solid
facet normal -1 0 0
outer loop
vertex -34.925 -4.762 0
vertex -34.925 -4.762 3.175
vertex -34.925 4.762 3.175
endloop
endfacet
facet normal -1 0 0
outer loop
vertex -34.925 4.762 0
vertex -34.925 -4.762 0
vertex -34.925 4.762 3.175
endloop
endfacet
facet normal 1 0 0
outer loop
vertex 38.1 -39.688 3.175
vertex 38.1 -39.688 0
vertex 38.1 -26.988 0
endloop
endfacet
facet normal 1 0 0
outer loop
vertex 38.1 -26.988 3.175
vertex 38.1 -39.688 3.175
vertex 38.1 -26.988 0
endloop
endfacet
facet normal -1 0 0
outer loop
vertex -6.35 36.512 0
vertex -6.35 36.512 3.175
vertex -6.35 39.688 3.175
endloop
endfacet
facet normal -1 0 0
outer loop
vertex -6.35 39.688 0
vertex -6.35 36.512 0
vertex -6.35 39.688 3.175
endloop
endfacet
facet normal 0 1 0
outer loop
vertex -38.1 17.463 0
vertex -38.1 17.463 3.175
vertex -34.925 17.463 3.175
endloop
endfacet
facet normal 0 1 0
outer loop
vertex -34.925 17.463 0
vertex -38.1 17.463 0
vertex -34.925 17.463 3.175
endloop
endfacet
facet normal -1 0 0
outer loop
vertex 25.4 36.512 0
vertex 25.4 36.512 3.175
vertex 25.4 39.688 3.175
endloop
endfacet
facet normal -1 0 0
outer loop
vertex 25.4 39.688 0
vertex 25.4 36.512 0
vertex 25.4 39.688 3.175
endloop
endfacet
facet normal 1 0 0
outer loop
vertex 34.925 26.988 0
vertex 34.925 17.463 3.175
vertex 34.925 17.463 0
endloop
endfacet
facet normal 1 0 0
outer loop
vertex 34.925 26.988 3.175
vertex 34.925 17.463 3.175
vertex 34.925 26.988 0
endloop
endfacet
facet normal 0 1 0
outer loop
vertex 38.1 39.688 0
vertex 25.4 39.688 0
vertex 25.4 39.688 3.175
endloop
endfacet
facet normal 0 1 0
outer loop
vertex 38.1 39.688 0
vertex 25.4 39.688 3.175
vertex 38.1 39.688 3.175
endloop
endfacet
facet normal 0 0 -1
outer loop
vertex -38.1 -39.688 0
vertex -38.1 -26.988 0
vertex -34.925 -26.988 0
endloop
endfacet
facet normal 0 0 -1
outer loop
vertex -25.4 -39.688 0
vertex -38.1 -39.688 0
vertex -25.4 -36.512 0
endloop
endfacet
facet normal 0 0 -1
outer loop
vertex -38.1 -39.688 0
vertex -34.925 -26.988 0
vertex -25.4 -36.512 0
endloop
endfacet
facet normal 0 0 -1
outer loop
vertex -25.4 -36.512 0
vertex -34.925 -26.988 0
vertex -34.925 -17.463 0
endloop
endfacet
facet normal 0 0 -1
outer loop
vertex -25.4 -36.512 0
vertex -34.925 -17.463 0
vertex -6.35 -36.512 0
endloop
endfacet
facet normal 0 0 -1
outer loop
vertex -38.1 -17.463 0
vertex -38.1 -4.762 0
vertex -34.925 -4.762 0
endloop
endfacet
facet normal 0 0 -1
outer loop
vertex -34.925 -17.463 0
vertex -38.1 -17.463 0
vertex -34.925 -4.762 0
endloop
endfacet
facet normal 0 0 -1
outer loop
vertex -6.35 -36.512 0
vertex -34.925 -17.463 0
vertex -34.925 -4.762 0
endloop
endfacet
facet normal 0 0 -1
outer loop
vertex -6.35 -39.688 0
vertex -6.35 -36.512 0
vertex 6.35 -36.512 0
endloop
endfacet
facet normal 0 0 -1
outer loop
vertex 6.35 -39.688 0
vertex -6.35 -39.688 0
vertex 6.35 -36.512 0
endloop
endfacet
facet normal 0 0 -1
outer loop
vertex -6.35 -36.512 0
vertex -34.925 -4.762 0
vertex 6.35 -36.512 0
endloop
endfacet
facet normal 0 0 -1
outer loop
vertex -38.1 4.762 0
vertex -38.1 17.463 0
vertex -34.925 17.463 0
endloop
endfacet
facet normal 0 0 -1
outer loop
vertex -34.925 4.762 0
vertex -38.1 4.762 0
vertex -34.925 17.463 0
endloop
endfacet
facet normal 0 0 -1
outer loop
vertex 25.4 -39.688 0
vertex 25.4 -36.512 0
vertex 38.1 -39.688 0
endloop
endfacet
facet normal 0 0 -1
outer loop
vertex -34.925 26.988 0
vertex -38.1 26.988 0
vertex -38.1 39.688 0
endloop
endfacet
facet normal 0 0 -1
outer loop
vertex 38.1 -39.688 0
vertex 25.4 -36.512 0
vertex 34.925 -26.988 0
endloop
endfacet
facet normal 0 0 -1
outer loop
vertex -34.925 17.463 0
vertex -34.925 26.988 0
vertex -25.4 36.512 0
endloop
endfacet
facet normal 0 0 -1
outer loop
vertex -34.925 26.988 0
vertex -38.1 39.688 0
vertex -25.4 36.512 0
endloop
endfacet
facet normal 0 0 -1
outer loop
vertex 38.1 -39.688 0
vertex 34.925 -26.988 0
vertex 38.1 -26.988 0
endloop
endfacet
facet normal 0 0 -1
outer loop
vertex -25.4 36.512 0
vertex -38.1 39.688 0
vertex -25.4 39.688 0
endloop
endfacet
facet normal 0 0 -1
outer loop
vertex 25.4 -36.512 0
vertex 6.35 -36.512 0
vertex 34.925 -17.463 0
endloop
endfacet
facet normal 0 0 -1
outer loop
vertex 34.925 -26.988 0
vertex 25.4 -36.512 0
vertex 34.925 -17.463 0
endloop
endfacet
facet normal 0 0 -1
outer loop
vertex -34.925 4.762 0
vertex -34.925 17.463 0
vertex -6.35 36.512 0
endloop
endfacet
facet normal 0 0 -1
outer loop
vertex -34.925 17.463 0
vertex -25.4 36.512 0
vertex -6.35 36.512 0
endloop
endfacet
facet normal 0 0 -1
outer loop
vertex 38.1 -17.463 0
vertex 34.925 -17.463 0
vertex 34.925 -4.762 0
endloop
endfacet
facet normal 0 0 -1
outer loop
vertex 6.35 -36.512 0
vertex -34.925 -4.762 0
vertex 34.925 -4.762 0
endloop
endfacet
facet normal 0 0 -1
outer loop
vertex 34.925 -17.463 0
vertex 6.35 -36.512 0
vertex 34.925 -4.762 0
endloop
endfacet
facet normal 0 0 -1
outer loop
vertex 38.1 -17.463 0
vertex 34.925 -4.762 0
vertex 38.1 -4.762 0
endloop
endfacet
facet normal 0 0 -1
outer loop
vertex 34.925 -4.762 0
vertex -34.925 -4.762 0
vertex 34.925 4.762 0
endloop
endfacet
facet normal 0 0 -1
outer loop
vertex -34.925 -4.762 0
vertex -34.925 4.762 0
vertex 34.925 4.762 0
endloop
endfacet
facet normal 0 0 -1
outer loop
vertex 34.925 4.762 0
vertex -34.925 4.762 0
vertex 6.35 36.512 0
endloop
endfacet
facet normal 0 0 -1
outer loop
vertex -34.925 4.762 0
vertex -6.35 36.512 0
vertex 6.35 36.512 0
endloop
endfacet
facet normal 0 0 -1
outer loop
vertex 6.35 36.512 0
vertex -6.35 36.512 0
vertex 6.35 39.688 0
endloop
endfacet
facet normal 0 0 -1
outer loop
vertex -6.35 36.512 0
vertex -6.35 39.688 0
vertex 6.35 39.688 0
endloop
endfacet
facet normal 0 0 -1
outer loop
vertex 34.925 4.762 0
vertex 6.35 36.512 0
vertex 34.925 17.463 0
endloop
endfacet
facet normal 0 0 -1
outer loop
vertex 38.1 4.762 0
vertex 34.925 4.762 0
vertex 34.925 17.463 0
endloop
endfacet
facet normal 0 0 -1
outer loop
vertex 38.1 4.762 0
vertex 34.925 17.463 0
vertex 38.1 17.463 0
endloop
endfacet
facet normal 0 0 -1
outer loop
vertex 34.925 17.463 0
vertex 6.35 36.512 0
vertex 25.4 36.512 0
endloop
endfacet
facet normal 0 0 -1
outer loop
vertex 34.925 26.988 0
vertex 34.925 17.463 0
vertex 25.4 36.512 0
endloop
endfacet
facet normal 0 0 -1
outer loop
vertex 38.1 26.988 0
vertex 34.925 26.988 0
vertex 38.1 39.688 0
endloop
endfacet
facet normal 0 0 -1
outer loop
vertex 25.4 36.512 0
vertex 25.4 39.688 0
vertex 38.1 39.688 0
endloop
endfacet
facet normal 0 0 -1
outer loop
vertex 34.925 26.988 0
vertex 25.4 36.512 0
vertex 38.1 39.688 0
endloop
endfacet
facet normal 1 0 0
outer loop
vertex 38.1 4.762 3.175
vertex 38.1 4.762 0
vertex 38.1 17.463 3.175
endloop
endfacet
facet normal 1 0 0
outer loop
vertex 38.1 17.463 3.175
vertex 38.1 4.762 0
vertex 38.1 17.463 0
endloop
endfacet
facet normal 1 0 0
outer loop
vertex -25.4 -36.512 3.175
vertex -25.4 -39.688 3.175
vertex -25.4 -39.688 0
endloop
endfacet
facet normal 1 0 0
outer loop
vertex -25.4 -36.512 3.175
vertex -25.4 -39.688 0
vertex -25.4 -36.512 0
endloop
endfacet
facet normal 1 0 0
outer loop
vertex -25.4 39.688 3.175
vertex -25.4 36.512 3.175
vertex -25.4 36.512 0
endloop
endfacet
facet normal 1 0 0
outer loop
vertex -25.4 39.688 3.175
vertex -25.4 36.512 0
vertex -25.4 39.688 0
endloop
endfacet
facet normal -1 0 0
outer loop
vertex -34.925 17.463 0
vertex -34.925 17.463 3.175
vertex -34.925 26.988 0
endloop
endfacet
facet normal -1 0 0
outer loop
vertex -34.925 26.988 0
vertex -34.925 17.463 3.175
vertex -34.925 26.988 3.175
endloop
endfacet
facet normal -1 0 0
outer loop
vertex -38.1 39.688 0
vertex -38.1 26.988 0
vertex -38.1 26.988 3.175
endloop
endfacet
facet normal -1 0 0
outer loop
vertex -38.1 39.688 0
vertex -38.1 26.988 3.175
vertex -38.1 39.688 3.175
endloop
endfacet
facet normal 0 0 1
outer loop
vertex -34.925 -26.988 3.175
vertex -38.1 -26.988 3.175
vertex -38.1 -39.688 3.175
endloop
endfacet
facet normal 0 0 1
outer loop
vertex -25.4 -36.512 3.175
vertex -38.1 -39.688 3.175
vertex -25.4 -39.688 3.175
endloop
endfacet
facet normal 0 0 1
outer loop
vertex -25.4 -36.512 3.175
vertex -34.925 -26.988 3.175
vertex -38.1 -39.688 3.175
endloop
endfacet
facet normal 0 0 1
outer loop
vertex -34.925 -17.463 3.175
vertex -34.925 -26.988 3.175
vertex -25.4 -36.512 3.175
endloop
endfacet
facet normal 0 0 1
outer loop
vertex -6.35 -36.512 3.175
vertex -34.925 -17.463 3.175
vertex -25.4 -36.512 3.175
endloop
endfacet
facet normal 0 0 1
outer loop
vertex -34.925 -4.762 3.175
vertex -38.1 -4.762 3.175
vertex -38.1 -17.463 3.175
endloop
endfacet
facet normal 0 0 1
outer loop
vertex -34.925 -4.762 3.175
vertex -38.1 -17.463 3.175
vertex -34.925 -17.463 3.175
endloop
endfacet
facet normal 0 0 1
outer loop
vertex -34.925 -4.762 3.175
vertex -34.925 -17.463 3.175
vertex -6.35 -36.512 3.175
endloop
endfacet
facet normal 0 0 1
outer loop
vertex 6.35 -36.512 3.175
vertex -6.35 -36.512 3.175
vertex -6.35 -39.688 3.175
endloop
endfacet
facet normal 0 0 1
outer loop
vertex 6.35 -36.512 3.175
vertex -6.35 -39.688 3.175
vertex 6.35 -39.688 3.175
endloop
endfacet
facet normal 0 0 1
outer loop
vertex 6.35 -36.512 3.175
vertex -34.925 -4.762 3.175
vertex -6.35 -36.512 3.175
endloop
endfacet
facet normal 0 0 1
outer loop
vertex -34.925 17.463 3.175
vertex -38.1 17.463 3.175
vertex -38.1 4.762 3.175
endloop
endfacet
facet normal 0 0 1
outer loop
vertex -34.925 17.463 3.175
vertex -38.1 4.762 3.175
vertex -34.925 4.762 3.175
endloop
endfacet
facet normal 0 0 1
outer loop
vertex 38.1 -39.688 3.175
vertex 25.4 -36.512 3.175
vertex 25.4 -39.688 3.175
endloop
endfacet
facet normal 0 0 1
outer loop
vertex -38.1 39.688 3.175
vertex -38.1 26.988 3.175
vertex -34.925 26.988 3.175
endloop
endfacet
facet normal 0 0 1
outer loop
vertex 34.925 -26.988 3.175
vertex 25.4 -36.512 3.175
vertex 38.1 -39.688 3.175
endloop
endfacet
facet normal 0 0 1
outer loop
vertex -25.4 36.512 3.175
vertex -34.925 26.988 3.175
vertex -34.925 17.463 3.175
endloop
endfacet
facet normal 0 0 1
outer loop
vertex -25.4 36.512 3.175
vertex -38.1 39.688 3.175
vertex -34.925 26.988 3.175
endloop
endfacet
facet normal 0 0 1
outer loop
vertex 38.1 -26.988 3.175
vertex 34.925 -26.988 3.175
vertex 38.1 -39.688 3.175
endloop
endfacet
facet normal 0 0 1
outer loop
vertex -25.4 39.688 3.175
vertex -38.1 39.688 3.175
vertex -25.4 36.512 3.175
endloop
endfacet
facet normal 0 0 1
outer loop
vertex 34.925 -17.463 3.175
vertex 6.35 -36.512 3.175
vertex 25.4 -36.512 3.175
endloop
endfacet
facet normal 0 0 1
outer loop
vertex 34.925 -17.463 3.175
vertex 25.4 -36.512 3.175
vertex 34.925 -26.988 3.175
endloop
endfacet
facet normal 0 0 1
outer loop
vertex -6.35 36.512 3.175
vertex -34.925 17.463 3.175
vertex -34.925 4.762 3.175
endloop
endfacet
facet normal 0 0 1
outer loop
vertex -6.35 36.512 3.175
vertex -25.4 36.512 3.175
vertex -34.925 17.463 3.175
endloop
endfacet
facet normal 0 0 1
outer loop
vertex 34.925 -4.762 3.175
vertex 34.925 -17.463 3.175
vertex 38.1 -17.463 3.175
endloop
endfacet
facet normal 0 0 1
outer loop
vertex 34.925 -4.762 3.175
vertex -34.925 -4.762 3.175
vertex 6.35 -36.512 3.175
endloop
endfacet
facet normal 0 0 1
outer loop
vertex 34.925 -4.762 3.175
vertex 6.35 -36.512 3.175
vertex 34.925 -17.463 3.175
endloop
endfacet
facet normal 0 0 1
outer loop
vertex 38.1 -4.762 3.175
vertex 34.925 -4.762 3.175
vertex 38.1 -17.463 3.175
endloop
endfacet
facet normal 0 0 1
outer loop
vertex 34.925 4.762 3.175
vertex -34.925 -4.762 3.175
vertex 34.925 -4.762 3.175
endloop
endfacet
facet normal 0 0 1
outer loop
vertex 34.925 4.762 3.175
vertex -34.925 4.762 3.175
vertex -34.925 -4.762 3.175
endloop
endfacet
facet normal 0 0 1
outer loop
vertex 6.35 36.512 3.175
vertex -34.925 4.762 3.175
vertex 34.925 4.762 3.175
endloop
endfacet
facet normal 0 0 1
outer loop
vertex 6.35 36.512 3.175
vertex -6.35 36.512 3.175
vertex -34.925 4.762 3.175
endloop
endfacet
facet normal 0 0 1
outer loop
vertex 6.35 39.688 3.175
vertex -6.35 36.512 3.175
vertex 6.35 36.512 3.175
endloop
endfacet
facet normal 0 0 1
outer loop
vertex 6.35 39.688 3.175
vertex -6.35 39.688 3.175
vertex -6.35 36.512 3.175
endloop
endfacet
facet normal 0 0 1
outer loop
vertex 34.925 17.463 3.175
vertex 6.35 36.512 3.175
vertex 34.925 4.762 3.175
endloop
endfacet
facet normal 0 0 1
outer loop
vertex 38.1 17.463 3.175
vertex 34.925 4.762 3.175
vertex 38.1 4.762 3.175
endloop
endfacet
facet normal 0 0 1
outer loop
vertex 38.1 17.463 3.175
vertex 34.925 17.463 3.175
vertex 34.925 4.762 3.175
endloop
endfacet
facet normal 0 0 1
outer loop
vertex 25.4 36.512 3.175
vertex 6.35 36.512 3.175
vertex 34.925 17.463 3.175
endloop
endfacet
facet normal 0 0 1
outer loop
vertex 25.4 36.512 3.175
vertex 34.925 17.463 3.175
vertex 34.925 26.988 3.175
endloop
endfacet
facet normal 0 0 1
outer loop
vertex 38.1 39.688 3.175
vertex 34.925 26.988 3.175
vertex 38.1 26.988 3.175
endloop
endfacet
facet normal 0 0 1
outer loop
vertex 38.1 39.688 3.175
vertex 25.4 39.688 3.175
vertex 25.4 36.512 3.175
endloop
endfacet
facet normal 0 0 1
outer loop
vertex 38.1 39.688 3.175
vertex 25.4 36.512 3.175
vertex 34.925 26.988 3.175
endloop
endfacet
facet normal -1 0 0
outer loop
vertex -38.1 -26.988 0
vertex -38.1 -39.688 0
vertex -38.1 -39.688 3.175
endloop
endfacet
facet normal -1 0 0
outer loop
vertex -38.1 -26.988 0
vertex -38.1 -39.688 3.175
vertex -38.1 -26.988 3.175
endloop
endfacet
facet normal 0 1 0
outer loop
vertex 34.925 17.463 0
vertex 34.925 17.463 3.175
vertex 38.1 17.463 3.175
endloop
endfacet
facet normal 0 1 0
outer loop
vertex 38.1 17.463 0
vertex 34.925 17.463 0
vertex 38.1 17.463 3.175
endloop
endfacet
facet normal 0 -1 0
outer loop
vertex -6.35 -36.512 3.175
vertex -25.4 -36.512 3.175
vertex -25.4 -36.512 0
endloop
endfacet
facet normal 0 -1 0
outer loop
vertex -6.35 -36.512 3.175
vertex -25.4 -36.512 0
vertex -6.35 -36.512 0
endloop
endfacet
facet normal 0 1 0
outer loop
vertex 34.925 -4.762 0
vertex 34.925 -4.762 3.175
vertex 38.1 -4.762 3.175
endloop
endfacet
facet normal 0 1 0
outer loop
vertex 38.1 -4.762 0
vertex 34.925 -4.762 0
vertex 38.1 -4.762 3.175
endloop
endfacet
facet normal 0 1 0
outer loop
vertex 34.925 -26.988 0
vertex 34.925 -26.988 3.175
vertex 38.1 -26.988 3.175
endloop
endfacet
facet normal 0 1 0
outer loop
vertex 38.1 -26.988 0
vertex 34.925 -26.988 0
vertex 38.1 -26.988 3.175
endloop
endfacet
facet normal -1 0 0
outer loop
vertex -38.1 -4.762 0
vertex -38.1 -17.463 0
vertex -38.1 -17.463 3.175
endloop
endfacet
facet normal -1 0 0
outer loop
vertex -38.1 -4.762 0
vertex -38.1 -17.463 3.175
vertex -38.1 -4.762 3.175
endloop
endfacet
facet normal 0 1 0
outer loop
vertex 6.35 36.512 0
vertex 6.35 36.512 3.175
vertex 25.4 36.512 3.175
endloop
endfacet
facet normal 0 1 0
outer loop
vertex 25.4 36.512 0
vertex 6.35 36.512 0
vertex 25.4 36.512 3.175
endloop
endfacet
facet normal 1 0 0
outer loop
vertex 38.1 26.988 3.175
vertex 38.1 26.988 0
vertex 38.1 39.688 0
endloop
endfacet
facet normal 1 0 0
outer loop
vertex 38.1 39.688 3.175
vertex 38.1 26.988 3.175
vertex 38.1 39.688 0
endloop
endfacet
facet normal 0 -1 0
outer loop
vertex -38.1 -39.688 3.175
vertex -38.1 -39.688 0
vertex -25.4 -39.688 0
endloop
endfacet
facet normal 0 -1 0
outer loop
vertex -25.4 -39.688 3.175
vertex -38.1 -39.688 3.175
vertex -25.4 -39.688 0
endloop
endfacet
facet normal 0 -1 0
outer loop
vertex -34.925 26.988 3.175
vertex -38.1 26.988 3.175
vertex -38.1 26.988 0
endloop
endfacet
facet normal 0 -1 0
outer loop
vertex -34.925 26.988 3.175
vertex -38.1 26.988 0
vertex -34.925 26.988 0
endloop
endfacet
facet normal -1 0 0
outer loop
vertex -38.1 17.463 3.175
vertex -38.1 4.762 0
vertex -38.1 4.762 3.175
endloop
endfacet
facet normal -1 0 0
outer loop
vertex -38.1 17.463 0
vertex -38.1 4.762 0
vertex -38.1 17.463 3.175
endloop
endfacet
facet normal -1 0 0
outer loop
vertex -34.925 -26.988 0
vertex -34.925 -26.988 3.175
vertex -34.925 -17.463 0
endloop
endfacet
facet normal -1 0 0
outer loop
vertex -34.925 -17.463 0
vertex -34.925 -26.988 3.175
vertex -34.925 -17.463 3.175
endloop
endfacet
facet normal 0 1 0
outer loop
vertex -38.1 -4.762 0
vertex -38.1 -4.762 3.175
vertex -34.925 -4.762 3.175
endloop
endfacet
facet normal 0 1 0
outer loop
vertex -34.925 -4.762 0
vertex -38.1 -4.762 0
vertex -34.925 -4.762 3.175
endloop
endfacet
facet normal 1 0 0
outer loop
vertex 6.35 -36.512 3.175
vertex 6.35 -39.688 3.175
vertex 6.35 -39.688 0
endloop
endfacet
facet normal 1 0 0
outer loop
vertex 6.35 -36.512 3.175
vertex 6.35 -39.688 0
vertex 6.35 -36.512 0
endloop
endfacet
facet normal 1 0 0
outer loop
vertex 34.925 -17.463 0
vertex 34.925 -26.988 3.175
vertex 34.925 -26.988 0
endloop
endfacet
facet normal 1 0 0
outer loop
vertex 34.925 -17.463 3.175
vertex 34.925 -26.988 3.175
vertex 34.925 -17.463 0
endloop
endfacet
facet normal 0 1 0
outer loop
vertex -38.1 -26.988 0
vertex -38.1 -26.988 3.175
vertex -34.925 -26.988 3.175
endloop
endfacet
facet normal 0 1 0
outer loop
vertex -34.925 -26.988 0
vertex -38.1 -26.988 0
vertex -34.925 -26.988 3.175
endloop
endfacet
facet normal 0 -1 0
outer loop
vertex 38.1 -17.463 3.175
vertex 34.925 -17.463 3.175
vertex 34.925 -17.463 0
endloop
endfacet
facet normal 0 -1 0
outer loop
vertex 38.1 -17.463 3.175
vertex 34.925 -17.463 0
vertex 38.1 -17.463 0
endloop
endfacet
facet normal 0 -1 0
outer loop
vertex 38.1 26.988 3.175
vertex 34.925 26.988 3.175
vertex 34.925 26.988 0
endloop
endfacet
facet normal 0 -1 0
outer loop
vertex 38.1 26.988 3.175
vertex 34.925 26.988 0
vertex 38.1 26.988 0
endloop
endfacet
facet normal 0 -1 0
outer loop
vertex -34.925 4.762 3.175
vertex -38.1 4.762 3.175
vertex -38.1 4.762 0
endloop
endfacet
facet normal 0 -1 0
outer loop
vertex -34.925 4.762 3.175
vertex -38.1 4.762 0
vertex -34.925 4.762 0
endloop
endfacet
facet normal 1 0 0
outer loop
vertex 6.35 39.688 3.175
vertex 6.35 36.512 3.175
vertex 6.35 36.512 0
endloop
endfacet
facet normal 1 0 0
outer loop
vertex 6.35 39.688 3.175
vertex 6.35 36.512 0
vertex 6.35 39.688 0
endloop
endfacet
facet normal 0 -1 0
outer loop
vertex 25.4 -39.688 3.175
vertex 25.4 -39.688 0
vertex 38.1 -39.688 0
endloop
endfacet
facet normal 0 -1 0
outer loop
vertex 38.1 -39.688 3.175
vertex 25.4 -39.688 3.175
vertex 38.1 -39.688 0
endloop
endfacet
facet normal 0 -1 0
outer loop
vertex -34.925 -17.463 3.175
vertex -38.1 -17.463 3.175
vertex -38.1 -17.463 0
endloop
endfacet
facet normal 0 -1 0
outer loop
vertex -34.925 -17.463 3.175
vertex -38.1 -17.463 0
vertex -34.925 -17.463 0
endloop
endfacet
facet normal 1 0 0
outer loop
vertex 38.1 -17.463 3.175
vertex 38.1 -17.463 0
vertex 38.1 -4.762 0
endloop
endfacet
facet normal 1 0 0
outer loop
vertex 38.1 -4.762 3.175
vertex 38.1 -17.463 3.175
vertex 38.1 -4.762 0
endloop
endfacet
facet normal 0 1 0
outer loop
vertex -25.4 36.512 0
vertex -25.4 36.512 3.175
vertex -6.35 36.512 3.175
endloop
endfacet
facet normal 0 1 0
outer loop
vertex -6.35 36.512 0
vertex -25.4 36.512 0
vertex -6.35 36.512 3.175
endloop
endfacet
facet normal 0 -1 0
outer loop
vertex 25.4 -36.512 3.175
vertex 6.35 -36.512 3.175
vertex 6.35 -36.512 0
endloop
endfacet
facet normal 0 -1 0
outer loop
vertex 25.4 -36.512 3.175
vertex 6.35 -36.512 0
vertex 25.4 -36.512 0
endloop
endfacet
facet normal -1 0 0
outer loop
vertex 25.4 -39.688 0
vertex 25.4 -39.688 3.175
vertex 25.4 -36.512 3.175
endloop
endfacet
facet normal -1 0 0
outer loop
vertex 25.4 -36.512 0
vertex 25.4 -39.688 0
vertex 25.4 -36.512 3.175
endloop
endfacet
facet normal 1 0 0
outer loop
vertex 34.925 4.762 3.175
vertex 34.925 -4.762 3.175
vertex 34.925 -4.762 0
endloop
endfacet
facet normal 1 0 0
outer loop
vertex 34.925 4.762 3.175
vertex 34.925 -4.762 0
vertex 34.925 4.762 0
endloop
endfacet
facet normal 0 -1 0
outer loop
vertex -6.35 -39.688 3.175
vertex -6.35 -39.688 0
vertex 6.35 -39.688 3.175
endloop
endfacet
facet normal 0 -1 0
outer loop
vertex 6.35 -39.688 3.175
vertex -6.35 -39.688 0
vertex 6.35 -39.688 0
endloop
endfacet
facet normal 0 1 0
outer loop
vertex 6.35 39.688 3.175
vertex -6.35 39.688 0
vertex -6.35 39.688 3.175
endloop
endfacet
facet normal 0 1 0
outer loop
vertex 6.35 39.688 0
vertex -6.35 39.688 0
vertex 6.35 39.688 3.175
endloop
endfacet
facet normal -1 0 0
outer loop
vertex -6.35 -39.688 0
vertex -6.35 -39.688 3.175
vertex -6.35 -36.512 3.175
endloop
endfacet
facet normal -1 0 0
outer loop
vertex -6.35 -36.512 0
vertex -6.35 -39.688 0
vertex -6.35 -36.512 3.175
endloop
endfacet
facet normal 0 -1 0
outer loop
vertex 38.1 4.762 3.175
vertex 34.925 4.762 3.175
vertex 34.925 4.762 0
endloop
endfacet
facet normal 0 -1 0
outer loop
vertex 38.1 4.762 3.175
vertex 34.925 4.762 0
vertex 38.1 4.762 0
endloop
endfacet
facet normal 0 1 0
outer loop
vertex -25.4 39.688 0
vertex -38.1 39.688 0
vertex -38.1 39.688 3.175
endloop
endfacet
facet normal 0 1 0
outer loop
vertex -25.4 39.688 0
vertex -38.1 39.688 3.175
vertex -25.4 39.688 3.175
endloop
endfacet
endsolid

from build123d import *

# Parameters (mm, degrees)
F0_W     = 76.2
F0_H     = 79.375
F1_DEPTH = 3.175
F2_W     = 19.05
F2_H     = 3.175
F3_DEPTH = 3.176
F4_W     = 3.175
F4_H     = 9.525
F5_DEPTH = 3.176


with BuildPart() as f1:
    # F0 (on Top) → F1 (new body)
    with BuildSketch(Plane.XY):
        Rectangle(F0_W, F0_H)
    extrude(amount=F1_DEPTH)

    # F2 (on face) → F3 (cut, through all)
    with BuildSketch(Plane.XY.offset(3.175)):
        with Locations((-15.875, 38.1)):
            Rectangle(F2_W, F2_H)
        with Locations((15.875, 38.1)):
            Rectangle(F2_W, F2_H)
        with Locations((15.875, -38.1)):
            Rectangle(F2_W, F2_H)
        with Locations((-15.875, -38.1)):
            Rectangle(F2_W, F2_H)
    extrude(amount=-F3_DEPTH, mode=Mode.SUBTRACT)

    # F4 (on face) → F5 (cut, through all)
    with BuildSketch(Plane.XY.offset(3.175)):
        with Locations((-36.5125, 22.225)):
            Rectangle(F4_W, F4_H)
        with Locations((-36.5125, 0)):
            Rectangle(F4_W, F4_H)
        with Locations((-36.5125, -22.225)):
            Rectangle(F4_W, F4_H)
        with Locations((36.5125, -22.225)):
            Rectangle(F4_W, F4_H)
        with Locations((36.5125, 0)):
            Rectangle(F4_W, F4_H)
        with Locations((36.5125, 22.225)):
            Rectangle(F4_W, F4_H)
    extrude(amount=-F5_DEPTH, mode=Mode.SUBTRACT)


solid = f1.part
